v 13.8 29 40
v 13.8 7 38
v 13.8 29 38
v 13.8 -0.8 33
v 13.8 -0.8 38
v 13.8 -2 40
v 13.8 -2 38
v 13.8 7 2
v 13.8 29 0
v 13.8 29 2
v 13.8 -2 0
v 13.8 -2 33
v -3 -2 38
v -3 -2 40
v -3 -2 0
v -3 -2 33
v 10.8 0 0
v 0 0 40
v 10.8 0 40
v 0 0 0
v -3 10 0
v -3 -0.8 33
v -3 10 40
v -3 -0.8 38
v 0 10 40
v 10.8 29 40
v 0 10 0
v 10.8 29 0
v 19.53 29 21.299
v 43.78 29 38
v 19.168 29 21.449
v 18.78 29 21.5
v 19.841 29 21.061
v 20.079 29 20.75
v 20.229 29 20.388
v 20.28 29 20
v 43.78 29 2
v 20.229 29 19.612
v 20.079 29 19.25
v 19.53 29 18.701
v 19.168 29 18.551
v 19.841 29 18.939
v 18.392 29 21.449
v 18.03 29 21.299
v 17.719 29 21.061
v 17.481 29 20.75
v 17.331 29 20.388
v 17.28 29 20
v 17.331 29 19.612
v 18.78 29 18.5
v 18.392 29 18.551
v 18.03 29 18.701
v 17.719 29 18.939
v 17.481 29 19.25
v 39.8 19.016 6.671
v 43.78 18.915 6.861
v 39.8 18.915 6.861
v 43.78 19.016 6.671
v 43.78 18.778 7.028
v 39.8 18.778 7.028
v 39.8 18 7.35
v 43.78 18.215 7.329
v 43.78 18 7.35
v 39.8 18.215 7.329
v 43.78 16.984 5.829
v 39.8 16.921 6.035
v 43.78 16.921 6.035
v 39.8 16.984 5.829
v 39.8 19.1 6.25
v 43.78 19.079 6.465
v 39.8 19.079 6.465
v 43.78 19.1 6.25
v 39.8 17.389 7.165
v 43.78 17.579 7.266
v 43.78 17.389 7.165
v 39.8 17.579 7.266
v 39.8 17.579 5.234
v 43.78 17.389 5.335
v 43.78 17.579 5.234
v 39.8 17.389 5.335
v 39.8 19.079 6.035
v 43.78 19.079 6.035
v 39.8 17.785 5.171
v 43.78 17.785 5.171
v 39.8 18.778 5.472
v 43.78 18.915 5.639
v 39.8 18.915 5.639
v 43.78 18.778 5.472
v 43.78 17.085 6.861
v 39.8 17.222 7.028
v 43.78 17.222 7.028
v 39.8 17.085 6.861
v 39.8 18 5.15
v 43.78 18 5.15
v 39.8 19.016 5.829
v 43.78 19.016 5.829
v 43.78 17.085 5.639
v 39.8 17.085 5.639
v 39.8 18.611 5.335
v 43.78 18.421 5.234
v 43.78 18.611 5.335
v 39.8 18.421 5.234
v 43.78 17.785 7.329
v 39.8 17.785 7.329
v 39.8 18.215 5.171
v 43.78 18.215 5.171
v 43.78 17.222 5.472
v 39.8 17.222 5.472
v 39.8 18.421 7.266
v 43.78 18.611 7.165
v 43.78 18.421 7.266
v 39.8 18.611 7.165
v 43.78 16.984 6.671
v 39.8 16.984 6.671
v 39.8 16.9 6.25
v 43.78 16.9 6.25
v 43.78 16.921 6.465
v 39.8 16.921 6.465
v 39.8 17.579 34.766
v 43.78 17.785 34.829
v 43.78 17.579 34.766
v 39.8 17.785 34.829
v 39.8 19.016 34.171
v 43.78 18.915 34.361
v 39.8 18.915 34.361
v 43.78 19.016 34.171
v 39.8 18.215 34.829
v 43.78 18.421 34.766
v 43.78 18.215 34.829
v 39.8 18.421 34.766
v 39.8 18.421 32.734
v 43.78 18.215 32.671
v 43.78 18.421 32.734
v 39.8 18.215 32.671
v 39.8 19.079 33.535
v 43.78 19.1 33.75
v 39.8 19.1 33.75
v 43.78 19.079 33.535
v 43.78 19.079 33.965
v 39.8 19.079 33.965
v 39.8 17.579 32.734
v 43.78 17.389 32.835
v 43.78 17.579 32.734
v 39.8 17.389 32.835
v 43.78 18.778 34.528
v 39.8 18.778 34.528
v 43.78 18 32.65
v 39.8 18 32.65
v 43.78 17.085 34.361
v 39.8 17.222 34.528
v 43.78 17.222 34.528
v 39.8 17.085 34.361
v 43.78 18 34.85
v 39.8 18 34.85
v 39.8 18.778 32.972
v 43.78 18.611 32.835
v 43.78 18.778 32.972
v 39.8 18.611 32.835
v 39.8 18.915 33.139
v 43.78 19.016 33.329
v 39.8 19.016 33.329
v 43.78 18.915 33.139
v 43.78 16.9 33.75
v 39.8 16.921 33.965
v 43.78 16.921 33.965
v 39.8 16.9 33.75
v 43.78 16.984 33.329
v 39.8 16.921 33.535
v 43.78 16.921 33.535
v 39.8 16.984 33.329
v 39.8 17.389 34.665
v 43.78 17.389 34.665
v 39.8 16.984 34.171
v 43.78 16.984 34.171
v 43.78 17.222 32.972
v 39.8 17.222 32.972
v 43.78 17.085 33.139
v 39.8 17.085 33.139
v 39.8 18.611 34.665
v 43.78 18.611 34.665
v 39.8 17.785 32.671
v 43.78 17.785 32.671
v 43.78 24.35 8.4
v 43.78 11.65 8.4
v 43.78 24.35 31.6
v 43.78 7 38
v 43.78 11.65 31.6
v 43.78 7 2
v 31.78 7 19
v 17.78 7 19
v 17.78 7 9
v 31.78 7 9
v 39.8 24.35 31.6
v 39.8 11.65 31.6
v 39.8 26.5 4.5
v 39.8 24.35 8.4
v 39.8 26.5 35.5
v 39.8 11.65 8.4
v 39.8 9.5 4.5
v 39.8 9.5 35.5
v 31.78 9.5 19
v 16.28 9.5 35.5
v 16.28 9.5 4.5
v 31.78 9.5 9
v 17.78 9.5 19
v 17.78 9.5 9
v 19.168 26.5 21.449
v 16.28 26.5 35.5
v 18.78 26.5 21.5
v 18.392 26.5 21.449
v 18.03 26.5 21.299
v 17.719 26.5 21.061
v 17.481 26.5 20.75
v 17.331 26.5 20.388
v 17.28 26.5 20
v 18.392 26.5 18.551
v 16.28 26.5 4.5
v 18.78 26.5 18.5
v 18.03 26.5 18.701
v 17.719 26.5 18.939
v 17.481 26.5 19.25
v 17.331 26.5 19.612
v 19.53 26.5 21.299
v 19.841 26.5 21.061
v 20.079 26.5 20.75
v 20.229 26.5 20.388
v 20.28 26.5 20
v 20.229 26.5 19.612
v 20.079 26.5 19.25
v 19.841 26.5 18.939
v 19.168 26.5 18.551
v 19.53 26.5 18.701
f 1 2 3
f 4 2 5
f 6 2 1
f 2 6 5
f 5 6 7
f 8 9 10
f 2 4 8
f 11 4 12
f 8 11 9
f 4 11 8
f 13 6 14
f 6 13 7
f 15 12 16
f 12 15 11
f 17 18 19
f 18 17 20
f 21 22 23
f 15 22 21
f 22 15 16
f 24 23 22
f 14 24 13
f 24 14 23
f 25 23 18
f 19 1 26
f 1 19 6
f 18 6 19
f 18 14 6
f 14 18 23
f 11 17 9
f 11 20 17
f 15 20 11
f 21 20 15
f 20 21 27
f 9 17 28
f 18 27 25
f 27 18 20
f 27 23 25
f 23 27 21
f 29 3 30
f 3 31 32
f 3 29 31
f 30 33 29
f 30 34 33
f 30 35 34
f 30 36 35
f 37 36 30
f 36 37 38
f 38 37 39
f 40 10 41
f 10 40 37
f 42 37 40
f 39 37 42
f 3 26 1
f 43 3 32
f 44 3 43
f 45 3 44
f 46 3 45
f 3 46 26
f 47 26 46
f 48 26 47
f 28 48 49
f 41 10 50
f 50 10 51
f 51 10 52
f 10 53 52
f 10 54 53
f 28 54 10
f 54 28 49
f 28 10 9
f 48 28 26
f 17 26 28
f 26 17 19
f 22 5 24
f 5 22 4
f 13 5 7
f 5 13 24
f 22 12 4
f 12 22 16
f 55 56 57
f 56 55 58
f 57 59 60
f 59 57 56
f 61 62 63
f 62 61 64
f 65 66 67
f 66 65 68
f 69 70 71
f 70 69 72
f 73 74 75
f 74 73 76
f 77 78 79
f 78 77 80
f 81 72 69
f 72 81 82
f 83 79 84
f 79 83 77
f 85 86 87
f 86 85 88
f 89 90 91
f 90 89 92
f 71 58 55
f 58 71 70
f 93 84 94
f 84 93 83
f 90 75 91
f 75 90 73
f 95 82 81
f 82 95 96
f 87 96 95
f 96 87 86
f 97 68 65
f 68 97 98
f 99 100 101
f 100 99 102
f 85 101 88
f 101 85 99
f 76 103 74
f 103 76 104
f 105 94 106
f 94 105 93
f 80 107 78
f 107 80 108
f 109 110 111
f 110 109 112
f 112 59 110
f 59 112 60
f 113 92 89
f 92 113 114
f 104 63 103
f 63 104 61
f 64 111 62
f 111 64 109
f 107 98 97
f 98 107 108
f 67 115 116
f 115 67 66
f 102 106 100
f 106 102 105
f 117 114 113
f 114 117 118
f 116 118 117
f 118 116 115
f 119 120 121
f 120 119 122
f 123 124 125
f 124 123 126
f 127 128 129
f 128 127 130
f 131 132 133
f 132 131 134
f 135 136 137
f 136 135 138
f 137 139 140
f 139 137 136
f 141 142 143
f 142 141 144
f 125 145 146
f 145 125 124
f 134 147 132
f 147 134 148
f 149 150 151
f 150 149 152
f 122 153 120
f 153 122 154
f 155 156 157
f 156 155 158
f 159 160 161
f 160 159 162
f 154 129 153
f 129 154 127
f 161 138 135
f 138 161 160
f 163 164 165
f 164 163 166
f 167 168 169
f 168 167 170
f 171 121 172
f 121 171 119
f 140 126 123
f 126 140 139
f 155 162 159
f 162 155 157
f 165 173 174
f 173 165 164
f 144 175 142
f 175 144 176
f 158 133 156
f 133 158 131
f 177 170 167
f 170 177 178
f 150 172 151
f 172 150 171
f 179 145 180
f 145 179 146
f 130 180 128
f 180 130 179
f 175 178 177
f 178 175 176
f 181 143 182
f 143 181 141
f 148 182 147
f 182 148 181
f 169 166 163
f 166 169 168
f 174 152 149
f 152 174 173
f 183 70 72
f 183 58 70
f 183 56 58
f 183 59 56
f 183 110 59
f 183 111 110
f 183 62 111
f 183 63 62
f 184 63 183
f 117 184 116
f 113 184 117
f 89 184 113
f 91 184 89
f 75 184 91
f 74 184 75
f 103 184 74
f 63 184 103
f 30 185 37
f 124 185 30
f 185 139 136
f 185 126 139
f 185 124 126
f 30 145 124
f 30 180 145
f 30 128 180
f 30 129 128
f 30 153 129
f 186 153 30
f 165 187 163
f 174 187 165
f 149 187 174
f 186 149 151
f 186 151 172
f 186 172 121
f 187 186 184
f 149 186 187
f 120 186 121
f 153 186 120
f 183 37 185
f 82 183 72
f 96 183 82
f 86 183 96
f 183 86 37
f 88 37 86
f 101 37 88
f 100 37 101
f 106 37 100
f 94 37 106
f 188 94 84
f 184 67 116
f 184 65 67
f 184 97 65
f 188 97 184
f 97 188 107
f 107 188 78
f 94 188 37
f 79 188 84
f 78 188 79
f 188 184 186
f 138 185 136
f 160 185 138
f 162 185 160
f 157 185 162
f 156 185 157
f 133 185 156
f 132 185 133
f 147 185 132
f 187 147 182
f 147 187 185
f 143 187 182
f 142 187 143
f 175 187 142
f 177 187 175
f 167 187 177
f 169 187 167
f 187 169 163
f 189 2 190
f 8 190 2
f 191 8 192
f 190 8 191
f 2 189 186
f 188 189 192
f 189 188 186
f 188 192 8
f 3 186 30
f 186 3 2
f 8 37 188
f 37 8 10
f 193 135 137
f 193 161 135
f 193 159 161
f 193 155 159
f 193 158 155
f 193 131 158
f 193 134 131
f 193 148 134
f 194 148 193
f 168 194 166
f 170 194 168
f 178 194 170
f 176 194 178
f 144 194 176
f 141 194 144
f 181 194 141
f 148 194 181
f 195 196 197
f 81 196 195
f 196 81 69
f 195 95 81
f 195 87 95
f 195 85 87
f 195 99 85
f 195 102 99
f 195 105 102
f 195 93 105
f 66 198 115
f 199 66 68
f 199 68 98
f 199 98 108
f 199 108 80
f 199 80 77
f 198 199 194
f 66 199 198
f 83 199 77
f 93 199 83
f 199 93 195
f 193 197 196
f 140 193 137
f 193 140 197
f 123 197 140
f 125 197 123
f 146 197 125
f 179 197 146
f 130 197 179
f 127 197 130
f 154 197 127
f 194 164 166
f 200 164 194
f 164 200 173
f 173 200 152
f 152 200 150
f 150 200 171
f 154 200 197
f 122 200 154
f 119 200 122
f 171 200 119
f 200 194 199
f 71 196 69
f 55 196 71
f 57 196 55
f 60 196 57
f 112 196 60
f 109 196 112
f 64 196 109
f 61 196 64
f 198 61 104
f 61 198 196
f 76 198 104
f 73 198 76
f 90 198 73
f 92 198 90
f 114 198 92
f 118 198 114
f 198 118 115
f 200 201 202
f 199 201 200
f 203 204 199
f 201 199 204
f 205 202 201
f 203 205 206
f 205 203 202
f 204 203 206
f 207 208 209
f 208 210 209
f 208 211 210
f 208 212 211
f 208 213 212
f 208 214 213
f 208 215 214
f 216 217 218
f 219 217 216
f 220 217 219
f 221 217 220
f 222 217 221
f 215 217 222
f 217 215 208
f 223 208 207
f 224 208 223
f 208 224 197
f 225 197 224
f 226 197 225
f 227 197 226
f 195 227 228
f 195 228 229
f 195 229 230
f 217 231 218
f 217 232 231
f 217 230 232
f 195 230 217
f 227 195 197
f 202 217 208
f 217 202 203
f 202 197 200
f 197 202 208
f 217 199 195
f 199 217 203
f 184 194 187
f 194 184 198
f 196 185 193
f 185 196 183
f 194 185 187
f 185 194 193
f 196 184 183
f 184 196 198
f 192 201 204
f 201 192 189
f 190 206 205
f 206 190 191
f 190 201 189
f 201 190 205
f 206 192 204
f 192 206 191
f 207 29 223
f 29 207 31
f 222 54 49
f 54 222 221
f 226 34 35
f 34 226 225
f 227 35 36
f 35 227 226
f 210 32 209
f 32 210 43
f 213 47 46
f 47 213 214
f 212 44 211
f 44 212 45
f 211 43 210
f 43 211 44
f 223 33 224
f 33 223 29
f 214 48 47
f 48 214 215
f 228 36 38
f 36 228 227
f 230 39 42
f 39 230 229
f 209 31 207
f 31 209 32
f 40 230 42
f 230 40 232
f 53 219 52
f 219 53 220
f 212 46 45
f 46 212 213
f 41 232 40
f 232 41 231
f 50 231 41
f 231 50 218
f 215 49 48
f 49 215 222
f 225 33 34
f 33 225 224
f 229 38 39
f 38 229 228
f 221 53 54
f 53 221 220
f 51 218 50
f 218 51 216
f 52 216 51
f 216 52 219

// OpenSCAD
// MG90S toilet-tank rim clip. Dimensions in mm.
// The black-box side (positive X) faces into the tank.
// Z = 0 is the highest point of the bare ceramic rim.
// F6, then File > Export > Export as STL.

/* [Print] */
part = "bracket"; // [bracket:Complete bracket,fit_check:Clip only]

// Measure the widest part of the ceramic rim over the depth of the clip.
rim_thickness = 10;
rim_clearance = 0.8;
// Available vertical space above the rim under the lid.
bridge_thickness = 2;
// Upper cable recess. Check it against the actual wire bundle.
cable_width = 5;
cable_recess_depth = 1.2;

/* [Servo mount] */
// Distance from the rim to the center of the servo mounting face.
servo_drop = 18;
servo_body_length = 22.5;
servo_body_width = 12;
servo_body_clearance = 0.7;
// Measure center to center on your MG90S mounting ears.
screw_pitch = 27.5;
screw_diameter = 2.2;
// Internal depth behind the mounting face, including wire bend space.
pocket_depth = 26;

/* [Hidden] */
eps = 0.02;
clip_width = 40;
leg_wall = 3;
outside_drop = 10;
box_height = 22;
box_width = 36;
box_wall = 2.5;
face_thickness = 4;
inside_drop = servo_drop + box_height / 2;
rim_gap = rim_thickness + rim_clearance;
box_bottom = -inside_drop;
box_left = rim_gap + leg_wall - eps;
mount_x = box_left + pocket_depth;
cable_y = clip_width / 2 - cable_width - 2;
opening_length = servo_body_length + servo_body_clearance;
opening_width = servo_body_width + servo_body_clearance;

assert(bridge_thickness - cable_recess_depth >= 0.8,
       "Leave at least 0.8 mm of material below the cable recess.");
assert(servo_drop - box_height / 2 >= 3,
       "Keep the servo pocket below the rim.");
assert(screw_pitch - screw_diameter > opening_length &&
       screw_pitch + screw_diameter < box_width,
       "Check the servo opening and mounting hole dimensions.");

module rim_clip() {
    difference() {
        union() {
            translate([-leg_wall, -clip_width / 2, 0])
                cube([rim_gap + 2 * leg_wall, clip_width, bridge_thickness]);
            translate([-leg_wall, -clip_width / 2, -outside_drop])
                cube([leg_wall, clip_width, outside_drop + eps]);
            translate([rim_gap, -clip_width / 2, -inside_drop])
                cube([leg_wall, clip_width, inside_drop + eps]);
        }
        translate([-leg_wall - eps, cable_y,
                   bridge_thickness - cable_recess_depth])
            cube([rim_gap + 2 * leg_wall + 2 * eps, cable_width,
                  cable_recess_depth + eps]);
    }
}

module servo_pocket() {
    difference() {
        translate([box_left, -box_width / 2, box_bottom])
            cube([pocket_depth + face_thickness, box_width, box_height]);

        // Pocket behind the screw plate.
        translate([box_left + box_wall, -box_width / 2 + box_wall,
                   box_bottom + box_wall])
            cube([pocket_depth - box_wall + eps, box_width - 2 * box_wall,
                  box_height - 2 * box_wall]);

        // Insert the servo body from inside the tank, horn facing inward.
        translate([mount_x - eps, -opening_length / 2,
                   -servo_drop - opening_width / 2])
            cube([face_thickness + 2 * eps, opening_length, opening_width]);

        for (y = [-screw_pitch / 2, screw_pitch / 2])
            translate([mount_x - eps, y, -servo_drop])
                rotate([0, 90, 0])
                    cylinder(h = face_thickness + 2 * eps,
                             d = screw_diameter, $fn = 32);

        // Feed the plug through the pocket roof before seating the servo.
        translate([box_left + 4, -11, box_bottom + box_height - box_wall - eps])
            cube([14, 10, box_wall + 2 * eps]);

        // Drain a splash or condensation from the pocket.
        translate([box_left + 5, 0, box_bottom - eps])
            cylinder(h = box_wall + 2 * eps, d = 3, $fn = 24);
    }
}

// Rotate onto a side so the U-shaped clip prints in the XY plane.
translate([0, 0, clip_width / 2])
    rotate([90, 0, 0])
        union() {
            rim_clip();
            if (part == "bracket")
                servo_pocket();
        }
